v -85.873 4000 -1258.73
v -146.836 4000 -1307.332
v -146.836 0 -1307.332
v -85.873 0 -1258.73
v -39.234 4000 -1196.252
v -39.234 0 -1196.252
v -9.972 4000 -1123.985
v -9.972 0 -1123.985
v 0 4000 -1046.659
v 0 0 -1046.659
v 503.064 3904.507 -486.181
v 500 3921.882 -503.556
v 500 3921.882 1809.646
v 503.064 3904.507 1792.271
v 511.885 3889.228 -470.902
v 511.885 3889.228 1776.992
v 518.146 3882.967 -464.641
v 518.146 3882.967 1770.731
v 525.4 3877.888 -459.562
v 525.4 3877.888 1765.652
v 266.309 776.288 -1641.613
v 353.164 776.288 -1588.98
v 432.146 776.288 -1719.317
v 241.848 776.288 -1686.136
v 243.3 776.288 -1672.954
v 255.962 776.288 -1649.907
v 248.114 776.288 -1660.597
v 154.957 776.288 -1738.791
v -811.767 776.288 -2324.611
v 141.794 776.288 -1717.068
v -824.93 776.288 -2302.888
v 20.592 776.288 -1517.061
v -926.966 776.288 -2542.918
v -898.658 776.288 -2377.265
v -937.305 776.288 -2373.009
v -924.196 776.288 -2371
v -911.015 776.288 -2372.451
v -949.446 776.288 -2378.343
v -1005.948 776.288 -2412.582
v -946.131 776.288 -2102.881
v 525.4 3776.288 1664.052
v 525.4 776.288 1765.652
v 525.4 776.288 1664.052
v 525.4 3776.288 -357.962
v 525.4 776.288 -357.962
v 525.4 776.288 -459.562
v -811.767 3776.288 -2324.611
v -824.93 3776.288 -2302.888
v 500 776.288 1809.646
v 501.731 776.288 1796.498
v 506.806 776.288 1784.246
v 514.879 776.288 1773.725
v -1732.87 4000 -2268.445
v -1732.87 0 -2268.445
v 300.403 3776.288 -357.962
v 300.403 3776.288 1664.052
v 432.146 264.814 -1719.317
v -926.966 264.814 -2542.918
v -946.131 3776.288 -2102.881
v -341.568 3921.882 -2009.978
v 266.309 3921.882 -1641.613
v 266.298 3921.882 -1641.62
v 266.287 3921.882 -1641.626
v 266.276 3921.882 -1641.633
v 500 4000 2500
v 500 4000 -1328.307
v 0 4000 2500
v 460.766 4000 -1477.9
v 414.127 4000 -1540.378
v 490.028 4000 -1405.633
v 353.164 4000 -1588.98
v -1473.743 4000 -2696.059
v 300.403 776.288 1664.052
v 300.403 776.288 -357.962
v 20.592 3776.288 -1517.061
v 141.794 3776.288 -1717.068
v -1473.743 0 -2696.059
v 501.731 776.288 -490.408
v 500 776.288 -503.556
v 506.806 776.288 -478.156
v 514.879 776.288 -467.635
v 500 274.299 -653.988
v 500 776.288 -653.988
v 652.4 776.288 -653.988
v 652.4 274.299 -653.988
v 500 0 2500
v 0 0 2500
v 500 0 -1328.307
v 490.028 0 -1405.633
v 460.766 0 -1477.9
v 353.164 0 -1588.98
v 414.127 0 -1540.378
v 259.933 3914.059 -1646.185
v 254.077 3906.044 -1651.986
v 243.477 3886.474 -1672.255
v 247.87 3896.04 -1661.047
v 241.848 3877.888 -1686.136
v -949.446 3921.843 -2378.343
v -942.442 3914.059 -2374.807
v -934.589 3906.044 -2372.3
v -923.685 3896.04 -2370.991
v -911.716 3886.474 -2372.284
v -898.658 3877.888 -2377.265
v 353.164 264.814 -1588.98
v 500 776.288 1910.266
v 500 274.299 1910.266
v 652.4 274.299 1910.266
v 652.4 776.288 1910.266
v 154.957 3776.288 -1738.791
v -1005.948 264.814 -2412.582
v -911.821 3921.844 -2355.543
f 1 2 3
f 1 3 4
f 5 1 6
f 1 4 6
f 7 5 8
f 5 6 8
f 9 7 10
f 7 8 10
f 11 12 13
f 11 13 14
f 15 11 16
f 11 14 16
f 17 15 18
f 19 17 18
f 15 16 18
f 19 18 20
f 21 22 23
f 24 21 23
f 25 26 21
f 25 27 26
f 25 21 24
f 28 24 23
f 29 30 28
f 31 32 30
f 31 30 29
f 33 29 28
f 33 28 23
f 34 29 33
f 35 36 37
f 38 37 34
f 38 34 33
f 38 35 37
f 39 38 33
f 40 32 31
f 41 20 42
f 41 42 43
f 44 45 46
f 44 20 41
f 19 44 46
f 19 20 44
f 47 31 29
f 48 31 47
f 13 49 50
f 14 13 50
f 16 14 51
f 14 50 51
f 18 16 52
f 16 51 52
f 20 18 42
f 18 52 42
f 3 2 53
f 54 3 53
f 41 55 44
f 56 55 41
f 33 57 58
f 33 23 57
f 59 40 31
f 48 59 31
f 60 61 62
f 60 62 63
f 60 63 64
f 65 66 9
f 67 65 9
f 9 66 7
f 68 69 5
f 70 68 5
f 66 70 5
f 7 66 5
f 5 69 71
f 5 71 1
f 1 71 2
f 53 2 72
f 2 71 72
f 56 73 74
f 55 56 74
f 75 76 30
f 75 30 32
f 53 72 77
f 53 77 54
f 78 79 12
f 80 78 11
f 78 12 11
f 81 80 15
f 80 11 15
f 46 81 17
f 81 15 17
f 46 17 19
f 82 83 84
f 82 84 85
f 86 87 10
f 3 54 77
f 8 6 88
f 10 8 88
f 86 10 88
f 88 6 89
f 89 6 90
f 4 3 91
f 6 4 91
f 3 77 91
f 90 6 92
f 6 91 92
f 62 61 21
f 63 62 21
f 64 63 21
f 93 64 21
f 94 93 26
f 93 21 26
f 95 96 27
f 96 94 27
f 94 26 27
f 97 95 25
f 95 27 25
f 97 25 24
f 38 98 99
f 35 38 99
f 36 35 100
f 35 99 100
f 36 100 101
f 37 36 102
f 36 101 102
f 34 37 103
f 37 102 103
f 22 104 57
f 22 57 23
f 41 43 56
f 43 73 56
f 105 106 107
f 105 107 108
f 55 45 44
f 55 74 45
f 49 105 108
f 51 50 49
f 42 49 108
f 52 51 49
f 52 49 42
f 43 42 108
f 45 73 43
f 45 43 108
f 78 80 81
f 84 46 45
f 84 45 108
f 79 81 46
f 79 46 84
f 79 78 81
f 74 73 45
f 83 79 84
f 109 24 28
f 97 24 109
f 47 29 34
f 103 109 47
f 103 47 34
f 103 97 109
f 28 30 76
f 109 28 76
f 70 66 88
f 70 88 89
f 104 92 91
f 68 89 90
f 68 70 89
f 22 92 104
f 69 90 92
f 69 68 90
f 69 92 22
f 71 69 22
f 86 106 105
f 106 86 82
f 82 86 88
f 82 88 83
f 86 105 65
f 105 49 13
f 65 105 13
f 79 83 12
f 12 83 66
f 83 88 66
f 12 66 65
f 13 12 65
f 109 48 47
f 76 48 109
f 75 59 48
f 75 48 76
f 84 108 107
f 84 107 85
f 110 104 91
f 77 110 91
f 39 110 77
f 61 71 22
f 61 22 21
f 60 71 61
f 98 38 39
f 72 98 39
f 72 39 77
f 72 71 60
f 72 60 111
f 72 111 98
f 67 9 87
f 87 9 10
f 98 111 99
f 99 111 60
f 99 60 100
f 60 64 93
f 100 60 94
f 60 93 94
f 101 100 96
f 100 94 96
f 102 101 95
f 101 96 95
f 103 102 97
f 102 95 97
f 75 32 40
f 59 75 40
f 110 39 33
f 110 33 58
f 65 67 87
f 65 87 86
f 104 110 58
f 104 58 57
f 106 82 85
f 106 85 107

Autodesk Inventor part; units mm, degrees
ref_plane "YZ Plane" through (0, 0, 0) normal (1, 0, 0) x (0, 1, 0)
ref_plane "XZ Plane" through (0, 0, 0) normal (0, 1, 0) x (-1, 0, 0)
sketch "Sketch1" plane through (0, 0, 0) normal (0, 0, 1) x (1, 0, 0)
  line L0 (0, 0) -> (500, 0)
  line L1 (500, 0) -> (500, 4000)
  line L2 (500, 4000) -> (0, 4000)
  line L3 (0, 4000) -> (0, 0)
  point P0 (250, 0)
  dimension "d0" = 500
  dimension "d1" = 4000
extrude "Extrusion1" add sketch "Sketch1" along normal mid plane 3000
sketch "Sketch2" plane through (0, 4000, 1500) normal (0, 1, 0) x (1, 0, 0)
  line L0 (0, 3000) -> (0, 0)
  line L1 (500, 0) -> (0, 0)
  line L2 (500, 3000) -> (500, 0)
  line L3 (0, 3000) -> (500, 3000)
  line L4 (500, 3000) -> (-1473.742944, 4196.058603)
  line L5 (0, 2718.352049) -> (-1732.870154, 3768.445356)
  line L6 (-1473.742944, 4196.058603) -> (-1732.870154, 3768.445356)
  point P0 (0, 1500)
  dimension "d18" = 500
extrude "Extrusion4" add sketch "Sketch2" against normal up to surface (4000 mm away) contours L0 L5 L6 L4 L3
fillet "Fillet2" radius 304.8 2 edges at (500, 2000, -1500) (0, 2000, -1218.352)
fillet "Fillet3" [suppressed]
fillet "Fillet4" [suppressed]
sketch "Sketch4" plane through (0, 0, 1500) normal (0, 0, 1) x (1, 0, 0)
  line L0 (0, 4000) -> (0, 0) projected
  line L1 (0, 0) -> (500, 0) projected
  line L2 (500, 0) -> (500, 4000) projected
  line L3 (500, 4000) -> (0, 4000) projected
extrude "Extrusion5" add sketch "Sketch4" along normal blind 1000
ref_plane "Work Plane3" through (0, 776.2875, 2500) normal (0, -1, 0) x (1, 0, 0)
sketch "Sketch5" plane through (0, 776.2875, 2500) normal (0, 1, 0) x (1, 0, 0)
  arc A0 (500, 3828.307409) -> (353.163947, 4088.980444) centre (195.2, 3828.307409) ccw
  line L0 (500, 0) -> (500, 3828.307409)
  line L1 (0, 0) -> (500, 0)
  line L2 (0, 3546.659458) -> (0, 0)
  arc A1 (0, 3546.659458) -> (-146.836053, 3807.332493) centre (-304.8, 3546.659458) ccw
  line L3 (-1732.870154, 4768.445356) -> (-146.836053, 3807.332493)
  line L4 (-1473.742944, 5196.058603) -> (-1732.870154, 4768.445356)
  line L5 (353.163947, 4088.980444) -> (-1473.742944, 5196.058603)
  line L6 (500, 835.948332) -> (300.402706, 835.948332)
  line L7 (300.402706, 835.948332) -> (300.402706, 2857.961935)
  line L8 (300.402706, 2857.961935) -> (500, 2857.961935)
  line L9 (141.793524, 4217.067748) -> (20.592459, 4017.061037)
  line L10 (20.592459, 4017.061037) -> (-946.13138, 4602.881175)
  line L11 (-946.13138, 4602.881175) -> (-824.930314, 4802.887887)
  point P0 (0, 2500)
extrude "Extrusion6" cut sketch "Sketch5" along normal blind 3000 contours L0 L6 L7 L8 | L9 L10 L11 L5
sketch "Sketch6" plane through (500, 0, -1328.307409) normal (1, 0, 0) x (0, 0, -1)
  line L0 (-970.345474, 776.2875) -> (-2992.359077, 776.2875)
  line L1 (-970.345474, 776.2875) -> (-970.345474, 3776.2875)
  line L2 (-970.345474, 3776.2875) -> (-2992.359077, 3776.2875)
  line L3 (-2992.359077, 776.2875) -> (-2992.359077, 3776.2875)
  line L4 (-3093.959077, 3877.8875) -> (-868.745474, 3877.8875)
  line L5 (-868.745474, 3877.8875) -> (-868.745474, 674.6875)
  line L6 (-868.745474, 674.6875) -> (-3093.959077, 674.6875)
  line L7 (-3093.959077, 674.6875) -> (-3093.959077, 3877.8875)
  point P0 (-1328.307409, 0)
  dimension "d29" = 101.6
extrude "Extrusion7" add sketch "Sketch6" along normal blind 25.4
sketch "Sketch7" plane through (-1473.742944, 0, -2696.058603) normal (0.5182544, 0, -0.8552265) x (-0.8552265, 0, -0.5182544)
  line L0 (-758.644212, 776.2875) -> (-1889.015927, 776.2875)
  line L1 (-758.644212, 776.2875) -> (-758.644212, 3776.2875)
  line L2 (-758.644212, 3776.2875) -> (-1889.015927, 3776.2875)
  line L3 (-1889.015927, 776.2875) -> (-1889.015927, 3776.2875)
  line L4 (-1990.615927, 3877.8875) -> (-657.044212, 3877.8875)
  line L5 (-657.044212, 3877.8875) -> (-657.044212, 674.6875)
  line L6 (-657.044212, 674.6875) -> (-1990.615927, 674.6875)
  line L7 (-1990.615927, 674.6875) -> (-1990.615927, 3877.8875)
  point P0 (-2657.628299, 0)
  dimension "d32" = 101.6
extrude "Extrusion8" add sketch "Sketch7" along normal blind 25.4
fillet "Fillet5" radius 50.8 8 edges at (500, 674.6875, 653.0449) (500, 2276.2875, -459.5619) (500, 3877.8875, 653.0449) (500, 2276.2875, 1765.6517) (-911.8213, 2276.2875, -2355.5425) (-341.5684, 674.6875, -2009.9778) (228.6845, 2276.2875, -1664.4131) (-341.5684, 3877.8875, -2009.9778)
sketch "Sketch8" plane through (500, 0, -1328.307409) normal (1, 0, 0) x (0, 0, -1)
  line L0 (-3093.959077, 674.6875) -> (-868.745474, 674.6875)
  line L1 (-868.745474, 674.6875) -> (-868.745474, 3877.8875)
  line L2 (-868.745474, 3877.8875) -> (-3093.959077, 3877.8875)
  line L3 (-3093.959077, 3877.8875) -> (-3093.959077, 674.6875)
  line L4 (-970.345474, 3776.2875) -> (-970.345474, 776.2875)
  line L5 (-970.345474, 776.2875) -> (-2992.359077, 776.2875)
  line L6 (-2992.359077, 776.2875) -> (-2992.359077, 3776.2875)
  line L7 (-2992.359077, 3776.2875) -> (-970.345474, 3776.2875)
  line L8 (-3238.573166, 776.2875) -> (-674.319307, 776.2875)
  line L9 (-674.319307, 776.2875) -> (-674.319307, 274.299032)
  line L10 (-674.319307, 274.299032) -> (-3238.573166, 274.299032)
  line L11 (-3238.573166, 274.299032) -> (-3238.573166, 776.2875)
  point P0 (-1328.307409, 0)
  point P1 (-3093.959077, 776.2875)
  point P2 (-868.745474, 776.2875)
  point P3 (-970.345474, 776.2875)
  point P4 (-2992.359077, 776.2875)
extrude "Extrusion9" add sketch "Sketch8" along normal blind 152.4 contours L3 L8 L5 L1 L0 | L0 L1 L8 L9 L10 L11 L3
sketch "Sketch9" plane through (-1473.742944, 0, -2696.058603) normal (0.5182544, 0, -0.8552265) x (-0.8552265, 0, -0.5182544)
  line L0 (-2136.167325, 0) -> (-2136.167325, 4000)
  line L1 (-2136.167325, 0) -> (0, 0)
  line L2 (0, 4000) -> (0, 0)
  line L3 (-2136.167325, 4000) -> (0, 4000)
  line L4 (-2034.610018, 3921.881591) -> (-2034.610018, 630.693409)
  line L5 (-613.050122, 3921.881591) -> (-2034.610018, 3921.881591)
  line L6 (-613.050122, 630.693409) -> (-613.050122, 3921.881591)
  line L7 (-2034.610018, 630.693409) -> (-613.050122, 630.693409)
  line L8 (-2876.645839, 776.2875) -> (-4205.581737, 776.2875)
  line L9 (-4205.581737, 776.2875) -> (-4205.581737, 274.299032)
  line L10 (-4205.581737, 274.299032) -> (-2876.645839, 274.299032)
  line L11 (-2876.645839, 274.299032) -> (-2876.645839, 776.2875)
  line L12 (-2136.167325, 776.2875) -> (-546.983817, 776.2875)
  line L13 (-546.983817, 776.2875) -> (-546.983817, 264.813662)
  line L14 (-546.983817, 264.813662) -> (-2136.167325, 264.813662)
  line L15 (-2136.167325, 264.813662) -> (-2136.167325, 776.2875)
  point P0 (-2657.628299, 0)
  point P1 (-2136.167325, 264.813662)
extrude "Extrusion10" add sketch "Sketch9" along normal blind 152.4 contours L0 L12 L4 L7 L6 L13 L14 | L12 L6 L7 L4
properties part number "wall"
